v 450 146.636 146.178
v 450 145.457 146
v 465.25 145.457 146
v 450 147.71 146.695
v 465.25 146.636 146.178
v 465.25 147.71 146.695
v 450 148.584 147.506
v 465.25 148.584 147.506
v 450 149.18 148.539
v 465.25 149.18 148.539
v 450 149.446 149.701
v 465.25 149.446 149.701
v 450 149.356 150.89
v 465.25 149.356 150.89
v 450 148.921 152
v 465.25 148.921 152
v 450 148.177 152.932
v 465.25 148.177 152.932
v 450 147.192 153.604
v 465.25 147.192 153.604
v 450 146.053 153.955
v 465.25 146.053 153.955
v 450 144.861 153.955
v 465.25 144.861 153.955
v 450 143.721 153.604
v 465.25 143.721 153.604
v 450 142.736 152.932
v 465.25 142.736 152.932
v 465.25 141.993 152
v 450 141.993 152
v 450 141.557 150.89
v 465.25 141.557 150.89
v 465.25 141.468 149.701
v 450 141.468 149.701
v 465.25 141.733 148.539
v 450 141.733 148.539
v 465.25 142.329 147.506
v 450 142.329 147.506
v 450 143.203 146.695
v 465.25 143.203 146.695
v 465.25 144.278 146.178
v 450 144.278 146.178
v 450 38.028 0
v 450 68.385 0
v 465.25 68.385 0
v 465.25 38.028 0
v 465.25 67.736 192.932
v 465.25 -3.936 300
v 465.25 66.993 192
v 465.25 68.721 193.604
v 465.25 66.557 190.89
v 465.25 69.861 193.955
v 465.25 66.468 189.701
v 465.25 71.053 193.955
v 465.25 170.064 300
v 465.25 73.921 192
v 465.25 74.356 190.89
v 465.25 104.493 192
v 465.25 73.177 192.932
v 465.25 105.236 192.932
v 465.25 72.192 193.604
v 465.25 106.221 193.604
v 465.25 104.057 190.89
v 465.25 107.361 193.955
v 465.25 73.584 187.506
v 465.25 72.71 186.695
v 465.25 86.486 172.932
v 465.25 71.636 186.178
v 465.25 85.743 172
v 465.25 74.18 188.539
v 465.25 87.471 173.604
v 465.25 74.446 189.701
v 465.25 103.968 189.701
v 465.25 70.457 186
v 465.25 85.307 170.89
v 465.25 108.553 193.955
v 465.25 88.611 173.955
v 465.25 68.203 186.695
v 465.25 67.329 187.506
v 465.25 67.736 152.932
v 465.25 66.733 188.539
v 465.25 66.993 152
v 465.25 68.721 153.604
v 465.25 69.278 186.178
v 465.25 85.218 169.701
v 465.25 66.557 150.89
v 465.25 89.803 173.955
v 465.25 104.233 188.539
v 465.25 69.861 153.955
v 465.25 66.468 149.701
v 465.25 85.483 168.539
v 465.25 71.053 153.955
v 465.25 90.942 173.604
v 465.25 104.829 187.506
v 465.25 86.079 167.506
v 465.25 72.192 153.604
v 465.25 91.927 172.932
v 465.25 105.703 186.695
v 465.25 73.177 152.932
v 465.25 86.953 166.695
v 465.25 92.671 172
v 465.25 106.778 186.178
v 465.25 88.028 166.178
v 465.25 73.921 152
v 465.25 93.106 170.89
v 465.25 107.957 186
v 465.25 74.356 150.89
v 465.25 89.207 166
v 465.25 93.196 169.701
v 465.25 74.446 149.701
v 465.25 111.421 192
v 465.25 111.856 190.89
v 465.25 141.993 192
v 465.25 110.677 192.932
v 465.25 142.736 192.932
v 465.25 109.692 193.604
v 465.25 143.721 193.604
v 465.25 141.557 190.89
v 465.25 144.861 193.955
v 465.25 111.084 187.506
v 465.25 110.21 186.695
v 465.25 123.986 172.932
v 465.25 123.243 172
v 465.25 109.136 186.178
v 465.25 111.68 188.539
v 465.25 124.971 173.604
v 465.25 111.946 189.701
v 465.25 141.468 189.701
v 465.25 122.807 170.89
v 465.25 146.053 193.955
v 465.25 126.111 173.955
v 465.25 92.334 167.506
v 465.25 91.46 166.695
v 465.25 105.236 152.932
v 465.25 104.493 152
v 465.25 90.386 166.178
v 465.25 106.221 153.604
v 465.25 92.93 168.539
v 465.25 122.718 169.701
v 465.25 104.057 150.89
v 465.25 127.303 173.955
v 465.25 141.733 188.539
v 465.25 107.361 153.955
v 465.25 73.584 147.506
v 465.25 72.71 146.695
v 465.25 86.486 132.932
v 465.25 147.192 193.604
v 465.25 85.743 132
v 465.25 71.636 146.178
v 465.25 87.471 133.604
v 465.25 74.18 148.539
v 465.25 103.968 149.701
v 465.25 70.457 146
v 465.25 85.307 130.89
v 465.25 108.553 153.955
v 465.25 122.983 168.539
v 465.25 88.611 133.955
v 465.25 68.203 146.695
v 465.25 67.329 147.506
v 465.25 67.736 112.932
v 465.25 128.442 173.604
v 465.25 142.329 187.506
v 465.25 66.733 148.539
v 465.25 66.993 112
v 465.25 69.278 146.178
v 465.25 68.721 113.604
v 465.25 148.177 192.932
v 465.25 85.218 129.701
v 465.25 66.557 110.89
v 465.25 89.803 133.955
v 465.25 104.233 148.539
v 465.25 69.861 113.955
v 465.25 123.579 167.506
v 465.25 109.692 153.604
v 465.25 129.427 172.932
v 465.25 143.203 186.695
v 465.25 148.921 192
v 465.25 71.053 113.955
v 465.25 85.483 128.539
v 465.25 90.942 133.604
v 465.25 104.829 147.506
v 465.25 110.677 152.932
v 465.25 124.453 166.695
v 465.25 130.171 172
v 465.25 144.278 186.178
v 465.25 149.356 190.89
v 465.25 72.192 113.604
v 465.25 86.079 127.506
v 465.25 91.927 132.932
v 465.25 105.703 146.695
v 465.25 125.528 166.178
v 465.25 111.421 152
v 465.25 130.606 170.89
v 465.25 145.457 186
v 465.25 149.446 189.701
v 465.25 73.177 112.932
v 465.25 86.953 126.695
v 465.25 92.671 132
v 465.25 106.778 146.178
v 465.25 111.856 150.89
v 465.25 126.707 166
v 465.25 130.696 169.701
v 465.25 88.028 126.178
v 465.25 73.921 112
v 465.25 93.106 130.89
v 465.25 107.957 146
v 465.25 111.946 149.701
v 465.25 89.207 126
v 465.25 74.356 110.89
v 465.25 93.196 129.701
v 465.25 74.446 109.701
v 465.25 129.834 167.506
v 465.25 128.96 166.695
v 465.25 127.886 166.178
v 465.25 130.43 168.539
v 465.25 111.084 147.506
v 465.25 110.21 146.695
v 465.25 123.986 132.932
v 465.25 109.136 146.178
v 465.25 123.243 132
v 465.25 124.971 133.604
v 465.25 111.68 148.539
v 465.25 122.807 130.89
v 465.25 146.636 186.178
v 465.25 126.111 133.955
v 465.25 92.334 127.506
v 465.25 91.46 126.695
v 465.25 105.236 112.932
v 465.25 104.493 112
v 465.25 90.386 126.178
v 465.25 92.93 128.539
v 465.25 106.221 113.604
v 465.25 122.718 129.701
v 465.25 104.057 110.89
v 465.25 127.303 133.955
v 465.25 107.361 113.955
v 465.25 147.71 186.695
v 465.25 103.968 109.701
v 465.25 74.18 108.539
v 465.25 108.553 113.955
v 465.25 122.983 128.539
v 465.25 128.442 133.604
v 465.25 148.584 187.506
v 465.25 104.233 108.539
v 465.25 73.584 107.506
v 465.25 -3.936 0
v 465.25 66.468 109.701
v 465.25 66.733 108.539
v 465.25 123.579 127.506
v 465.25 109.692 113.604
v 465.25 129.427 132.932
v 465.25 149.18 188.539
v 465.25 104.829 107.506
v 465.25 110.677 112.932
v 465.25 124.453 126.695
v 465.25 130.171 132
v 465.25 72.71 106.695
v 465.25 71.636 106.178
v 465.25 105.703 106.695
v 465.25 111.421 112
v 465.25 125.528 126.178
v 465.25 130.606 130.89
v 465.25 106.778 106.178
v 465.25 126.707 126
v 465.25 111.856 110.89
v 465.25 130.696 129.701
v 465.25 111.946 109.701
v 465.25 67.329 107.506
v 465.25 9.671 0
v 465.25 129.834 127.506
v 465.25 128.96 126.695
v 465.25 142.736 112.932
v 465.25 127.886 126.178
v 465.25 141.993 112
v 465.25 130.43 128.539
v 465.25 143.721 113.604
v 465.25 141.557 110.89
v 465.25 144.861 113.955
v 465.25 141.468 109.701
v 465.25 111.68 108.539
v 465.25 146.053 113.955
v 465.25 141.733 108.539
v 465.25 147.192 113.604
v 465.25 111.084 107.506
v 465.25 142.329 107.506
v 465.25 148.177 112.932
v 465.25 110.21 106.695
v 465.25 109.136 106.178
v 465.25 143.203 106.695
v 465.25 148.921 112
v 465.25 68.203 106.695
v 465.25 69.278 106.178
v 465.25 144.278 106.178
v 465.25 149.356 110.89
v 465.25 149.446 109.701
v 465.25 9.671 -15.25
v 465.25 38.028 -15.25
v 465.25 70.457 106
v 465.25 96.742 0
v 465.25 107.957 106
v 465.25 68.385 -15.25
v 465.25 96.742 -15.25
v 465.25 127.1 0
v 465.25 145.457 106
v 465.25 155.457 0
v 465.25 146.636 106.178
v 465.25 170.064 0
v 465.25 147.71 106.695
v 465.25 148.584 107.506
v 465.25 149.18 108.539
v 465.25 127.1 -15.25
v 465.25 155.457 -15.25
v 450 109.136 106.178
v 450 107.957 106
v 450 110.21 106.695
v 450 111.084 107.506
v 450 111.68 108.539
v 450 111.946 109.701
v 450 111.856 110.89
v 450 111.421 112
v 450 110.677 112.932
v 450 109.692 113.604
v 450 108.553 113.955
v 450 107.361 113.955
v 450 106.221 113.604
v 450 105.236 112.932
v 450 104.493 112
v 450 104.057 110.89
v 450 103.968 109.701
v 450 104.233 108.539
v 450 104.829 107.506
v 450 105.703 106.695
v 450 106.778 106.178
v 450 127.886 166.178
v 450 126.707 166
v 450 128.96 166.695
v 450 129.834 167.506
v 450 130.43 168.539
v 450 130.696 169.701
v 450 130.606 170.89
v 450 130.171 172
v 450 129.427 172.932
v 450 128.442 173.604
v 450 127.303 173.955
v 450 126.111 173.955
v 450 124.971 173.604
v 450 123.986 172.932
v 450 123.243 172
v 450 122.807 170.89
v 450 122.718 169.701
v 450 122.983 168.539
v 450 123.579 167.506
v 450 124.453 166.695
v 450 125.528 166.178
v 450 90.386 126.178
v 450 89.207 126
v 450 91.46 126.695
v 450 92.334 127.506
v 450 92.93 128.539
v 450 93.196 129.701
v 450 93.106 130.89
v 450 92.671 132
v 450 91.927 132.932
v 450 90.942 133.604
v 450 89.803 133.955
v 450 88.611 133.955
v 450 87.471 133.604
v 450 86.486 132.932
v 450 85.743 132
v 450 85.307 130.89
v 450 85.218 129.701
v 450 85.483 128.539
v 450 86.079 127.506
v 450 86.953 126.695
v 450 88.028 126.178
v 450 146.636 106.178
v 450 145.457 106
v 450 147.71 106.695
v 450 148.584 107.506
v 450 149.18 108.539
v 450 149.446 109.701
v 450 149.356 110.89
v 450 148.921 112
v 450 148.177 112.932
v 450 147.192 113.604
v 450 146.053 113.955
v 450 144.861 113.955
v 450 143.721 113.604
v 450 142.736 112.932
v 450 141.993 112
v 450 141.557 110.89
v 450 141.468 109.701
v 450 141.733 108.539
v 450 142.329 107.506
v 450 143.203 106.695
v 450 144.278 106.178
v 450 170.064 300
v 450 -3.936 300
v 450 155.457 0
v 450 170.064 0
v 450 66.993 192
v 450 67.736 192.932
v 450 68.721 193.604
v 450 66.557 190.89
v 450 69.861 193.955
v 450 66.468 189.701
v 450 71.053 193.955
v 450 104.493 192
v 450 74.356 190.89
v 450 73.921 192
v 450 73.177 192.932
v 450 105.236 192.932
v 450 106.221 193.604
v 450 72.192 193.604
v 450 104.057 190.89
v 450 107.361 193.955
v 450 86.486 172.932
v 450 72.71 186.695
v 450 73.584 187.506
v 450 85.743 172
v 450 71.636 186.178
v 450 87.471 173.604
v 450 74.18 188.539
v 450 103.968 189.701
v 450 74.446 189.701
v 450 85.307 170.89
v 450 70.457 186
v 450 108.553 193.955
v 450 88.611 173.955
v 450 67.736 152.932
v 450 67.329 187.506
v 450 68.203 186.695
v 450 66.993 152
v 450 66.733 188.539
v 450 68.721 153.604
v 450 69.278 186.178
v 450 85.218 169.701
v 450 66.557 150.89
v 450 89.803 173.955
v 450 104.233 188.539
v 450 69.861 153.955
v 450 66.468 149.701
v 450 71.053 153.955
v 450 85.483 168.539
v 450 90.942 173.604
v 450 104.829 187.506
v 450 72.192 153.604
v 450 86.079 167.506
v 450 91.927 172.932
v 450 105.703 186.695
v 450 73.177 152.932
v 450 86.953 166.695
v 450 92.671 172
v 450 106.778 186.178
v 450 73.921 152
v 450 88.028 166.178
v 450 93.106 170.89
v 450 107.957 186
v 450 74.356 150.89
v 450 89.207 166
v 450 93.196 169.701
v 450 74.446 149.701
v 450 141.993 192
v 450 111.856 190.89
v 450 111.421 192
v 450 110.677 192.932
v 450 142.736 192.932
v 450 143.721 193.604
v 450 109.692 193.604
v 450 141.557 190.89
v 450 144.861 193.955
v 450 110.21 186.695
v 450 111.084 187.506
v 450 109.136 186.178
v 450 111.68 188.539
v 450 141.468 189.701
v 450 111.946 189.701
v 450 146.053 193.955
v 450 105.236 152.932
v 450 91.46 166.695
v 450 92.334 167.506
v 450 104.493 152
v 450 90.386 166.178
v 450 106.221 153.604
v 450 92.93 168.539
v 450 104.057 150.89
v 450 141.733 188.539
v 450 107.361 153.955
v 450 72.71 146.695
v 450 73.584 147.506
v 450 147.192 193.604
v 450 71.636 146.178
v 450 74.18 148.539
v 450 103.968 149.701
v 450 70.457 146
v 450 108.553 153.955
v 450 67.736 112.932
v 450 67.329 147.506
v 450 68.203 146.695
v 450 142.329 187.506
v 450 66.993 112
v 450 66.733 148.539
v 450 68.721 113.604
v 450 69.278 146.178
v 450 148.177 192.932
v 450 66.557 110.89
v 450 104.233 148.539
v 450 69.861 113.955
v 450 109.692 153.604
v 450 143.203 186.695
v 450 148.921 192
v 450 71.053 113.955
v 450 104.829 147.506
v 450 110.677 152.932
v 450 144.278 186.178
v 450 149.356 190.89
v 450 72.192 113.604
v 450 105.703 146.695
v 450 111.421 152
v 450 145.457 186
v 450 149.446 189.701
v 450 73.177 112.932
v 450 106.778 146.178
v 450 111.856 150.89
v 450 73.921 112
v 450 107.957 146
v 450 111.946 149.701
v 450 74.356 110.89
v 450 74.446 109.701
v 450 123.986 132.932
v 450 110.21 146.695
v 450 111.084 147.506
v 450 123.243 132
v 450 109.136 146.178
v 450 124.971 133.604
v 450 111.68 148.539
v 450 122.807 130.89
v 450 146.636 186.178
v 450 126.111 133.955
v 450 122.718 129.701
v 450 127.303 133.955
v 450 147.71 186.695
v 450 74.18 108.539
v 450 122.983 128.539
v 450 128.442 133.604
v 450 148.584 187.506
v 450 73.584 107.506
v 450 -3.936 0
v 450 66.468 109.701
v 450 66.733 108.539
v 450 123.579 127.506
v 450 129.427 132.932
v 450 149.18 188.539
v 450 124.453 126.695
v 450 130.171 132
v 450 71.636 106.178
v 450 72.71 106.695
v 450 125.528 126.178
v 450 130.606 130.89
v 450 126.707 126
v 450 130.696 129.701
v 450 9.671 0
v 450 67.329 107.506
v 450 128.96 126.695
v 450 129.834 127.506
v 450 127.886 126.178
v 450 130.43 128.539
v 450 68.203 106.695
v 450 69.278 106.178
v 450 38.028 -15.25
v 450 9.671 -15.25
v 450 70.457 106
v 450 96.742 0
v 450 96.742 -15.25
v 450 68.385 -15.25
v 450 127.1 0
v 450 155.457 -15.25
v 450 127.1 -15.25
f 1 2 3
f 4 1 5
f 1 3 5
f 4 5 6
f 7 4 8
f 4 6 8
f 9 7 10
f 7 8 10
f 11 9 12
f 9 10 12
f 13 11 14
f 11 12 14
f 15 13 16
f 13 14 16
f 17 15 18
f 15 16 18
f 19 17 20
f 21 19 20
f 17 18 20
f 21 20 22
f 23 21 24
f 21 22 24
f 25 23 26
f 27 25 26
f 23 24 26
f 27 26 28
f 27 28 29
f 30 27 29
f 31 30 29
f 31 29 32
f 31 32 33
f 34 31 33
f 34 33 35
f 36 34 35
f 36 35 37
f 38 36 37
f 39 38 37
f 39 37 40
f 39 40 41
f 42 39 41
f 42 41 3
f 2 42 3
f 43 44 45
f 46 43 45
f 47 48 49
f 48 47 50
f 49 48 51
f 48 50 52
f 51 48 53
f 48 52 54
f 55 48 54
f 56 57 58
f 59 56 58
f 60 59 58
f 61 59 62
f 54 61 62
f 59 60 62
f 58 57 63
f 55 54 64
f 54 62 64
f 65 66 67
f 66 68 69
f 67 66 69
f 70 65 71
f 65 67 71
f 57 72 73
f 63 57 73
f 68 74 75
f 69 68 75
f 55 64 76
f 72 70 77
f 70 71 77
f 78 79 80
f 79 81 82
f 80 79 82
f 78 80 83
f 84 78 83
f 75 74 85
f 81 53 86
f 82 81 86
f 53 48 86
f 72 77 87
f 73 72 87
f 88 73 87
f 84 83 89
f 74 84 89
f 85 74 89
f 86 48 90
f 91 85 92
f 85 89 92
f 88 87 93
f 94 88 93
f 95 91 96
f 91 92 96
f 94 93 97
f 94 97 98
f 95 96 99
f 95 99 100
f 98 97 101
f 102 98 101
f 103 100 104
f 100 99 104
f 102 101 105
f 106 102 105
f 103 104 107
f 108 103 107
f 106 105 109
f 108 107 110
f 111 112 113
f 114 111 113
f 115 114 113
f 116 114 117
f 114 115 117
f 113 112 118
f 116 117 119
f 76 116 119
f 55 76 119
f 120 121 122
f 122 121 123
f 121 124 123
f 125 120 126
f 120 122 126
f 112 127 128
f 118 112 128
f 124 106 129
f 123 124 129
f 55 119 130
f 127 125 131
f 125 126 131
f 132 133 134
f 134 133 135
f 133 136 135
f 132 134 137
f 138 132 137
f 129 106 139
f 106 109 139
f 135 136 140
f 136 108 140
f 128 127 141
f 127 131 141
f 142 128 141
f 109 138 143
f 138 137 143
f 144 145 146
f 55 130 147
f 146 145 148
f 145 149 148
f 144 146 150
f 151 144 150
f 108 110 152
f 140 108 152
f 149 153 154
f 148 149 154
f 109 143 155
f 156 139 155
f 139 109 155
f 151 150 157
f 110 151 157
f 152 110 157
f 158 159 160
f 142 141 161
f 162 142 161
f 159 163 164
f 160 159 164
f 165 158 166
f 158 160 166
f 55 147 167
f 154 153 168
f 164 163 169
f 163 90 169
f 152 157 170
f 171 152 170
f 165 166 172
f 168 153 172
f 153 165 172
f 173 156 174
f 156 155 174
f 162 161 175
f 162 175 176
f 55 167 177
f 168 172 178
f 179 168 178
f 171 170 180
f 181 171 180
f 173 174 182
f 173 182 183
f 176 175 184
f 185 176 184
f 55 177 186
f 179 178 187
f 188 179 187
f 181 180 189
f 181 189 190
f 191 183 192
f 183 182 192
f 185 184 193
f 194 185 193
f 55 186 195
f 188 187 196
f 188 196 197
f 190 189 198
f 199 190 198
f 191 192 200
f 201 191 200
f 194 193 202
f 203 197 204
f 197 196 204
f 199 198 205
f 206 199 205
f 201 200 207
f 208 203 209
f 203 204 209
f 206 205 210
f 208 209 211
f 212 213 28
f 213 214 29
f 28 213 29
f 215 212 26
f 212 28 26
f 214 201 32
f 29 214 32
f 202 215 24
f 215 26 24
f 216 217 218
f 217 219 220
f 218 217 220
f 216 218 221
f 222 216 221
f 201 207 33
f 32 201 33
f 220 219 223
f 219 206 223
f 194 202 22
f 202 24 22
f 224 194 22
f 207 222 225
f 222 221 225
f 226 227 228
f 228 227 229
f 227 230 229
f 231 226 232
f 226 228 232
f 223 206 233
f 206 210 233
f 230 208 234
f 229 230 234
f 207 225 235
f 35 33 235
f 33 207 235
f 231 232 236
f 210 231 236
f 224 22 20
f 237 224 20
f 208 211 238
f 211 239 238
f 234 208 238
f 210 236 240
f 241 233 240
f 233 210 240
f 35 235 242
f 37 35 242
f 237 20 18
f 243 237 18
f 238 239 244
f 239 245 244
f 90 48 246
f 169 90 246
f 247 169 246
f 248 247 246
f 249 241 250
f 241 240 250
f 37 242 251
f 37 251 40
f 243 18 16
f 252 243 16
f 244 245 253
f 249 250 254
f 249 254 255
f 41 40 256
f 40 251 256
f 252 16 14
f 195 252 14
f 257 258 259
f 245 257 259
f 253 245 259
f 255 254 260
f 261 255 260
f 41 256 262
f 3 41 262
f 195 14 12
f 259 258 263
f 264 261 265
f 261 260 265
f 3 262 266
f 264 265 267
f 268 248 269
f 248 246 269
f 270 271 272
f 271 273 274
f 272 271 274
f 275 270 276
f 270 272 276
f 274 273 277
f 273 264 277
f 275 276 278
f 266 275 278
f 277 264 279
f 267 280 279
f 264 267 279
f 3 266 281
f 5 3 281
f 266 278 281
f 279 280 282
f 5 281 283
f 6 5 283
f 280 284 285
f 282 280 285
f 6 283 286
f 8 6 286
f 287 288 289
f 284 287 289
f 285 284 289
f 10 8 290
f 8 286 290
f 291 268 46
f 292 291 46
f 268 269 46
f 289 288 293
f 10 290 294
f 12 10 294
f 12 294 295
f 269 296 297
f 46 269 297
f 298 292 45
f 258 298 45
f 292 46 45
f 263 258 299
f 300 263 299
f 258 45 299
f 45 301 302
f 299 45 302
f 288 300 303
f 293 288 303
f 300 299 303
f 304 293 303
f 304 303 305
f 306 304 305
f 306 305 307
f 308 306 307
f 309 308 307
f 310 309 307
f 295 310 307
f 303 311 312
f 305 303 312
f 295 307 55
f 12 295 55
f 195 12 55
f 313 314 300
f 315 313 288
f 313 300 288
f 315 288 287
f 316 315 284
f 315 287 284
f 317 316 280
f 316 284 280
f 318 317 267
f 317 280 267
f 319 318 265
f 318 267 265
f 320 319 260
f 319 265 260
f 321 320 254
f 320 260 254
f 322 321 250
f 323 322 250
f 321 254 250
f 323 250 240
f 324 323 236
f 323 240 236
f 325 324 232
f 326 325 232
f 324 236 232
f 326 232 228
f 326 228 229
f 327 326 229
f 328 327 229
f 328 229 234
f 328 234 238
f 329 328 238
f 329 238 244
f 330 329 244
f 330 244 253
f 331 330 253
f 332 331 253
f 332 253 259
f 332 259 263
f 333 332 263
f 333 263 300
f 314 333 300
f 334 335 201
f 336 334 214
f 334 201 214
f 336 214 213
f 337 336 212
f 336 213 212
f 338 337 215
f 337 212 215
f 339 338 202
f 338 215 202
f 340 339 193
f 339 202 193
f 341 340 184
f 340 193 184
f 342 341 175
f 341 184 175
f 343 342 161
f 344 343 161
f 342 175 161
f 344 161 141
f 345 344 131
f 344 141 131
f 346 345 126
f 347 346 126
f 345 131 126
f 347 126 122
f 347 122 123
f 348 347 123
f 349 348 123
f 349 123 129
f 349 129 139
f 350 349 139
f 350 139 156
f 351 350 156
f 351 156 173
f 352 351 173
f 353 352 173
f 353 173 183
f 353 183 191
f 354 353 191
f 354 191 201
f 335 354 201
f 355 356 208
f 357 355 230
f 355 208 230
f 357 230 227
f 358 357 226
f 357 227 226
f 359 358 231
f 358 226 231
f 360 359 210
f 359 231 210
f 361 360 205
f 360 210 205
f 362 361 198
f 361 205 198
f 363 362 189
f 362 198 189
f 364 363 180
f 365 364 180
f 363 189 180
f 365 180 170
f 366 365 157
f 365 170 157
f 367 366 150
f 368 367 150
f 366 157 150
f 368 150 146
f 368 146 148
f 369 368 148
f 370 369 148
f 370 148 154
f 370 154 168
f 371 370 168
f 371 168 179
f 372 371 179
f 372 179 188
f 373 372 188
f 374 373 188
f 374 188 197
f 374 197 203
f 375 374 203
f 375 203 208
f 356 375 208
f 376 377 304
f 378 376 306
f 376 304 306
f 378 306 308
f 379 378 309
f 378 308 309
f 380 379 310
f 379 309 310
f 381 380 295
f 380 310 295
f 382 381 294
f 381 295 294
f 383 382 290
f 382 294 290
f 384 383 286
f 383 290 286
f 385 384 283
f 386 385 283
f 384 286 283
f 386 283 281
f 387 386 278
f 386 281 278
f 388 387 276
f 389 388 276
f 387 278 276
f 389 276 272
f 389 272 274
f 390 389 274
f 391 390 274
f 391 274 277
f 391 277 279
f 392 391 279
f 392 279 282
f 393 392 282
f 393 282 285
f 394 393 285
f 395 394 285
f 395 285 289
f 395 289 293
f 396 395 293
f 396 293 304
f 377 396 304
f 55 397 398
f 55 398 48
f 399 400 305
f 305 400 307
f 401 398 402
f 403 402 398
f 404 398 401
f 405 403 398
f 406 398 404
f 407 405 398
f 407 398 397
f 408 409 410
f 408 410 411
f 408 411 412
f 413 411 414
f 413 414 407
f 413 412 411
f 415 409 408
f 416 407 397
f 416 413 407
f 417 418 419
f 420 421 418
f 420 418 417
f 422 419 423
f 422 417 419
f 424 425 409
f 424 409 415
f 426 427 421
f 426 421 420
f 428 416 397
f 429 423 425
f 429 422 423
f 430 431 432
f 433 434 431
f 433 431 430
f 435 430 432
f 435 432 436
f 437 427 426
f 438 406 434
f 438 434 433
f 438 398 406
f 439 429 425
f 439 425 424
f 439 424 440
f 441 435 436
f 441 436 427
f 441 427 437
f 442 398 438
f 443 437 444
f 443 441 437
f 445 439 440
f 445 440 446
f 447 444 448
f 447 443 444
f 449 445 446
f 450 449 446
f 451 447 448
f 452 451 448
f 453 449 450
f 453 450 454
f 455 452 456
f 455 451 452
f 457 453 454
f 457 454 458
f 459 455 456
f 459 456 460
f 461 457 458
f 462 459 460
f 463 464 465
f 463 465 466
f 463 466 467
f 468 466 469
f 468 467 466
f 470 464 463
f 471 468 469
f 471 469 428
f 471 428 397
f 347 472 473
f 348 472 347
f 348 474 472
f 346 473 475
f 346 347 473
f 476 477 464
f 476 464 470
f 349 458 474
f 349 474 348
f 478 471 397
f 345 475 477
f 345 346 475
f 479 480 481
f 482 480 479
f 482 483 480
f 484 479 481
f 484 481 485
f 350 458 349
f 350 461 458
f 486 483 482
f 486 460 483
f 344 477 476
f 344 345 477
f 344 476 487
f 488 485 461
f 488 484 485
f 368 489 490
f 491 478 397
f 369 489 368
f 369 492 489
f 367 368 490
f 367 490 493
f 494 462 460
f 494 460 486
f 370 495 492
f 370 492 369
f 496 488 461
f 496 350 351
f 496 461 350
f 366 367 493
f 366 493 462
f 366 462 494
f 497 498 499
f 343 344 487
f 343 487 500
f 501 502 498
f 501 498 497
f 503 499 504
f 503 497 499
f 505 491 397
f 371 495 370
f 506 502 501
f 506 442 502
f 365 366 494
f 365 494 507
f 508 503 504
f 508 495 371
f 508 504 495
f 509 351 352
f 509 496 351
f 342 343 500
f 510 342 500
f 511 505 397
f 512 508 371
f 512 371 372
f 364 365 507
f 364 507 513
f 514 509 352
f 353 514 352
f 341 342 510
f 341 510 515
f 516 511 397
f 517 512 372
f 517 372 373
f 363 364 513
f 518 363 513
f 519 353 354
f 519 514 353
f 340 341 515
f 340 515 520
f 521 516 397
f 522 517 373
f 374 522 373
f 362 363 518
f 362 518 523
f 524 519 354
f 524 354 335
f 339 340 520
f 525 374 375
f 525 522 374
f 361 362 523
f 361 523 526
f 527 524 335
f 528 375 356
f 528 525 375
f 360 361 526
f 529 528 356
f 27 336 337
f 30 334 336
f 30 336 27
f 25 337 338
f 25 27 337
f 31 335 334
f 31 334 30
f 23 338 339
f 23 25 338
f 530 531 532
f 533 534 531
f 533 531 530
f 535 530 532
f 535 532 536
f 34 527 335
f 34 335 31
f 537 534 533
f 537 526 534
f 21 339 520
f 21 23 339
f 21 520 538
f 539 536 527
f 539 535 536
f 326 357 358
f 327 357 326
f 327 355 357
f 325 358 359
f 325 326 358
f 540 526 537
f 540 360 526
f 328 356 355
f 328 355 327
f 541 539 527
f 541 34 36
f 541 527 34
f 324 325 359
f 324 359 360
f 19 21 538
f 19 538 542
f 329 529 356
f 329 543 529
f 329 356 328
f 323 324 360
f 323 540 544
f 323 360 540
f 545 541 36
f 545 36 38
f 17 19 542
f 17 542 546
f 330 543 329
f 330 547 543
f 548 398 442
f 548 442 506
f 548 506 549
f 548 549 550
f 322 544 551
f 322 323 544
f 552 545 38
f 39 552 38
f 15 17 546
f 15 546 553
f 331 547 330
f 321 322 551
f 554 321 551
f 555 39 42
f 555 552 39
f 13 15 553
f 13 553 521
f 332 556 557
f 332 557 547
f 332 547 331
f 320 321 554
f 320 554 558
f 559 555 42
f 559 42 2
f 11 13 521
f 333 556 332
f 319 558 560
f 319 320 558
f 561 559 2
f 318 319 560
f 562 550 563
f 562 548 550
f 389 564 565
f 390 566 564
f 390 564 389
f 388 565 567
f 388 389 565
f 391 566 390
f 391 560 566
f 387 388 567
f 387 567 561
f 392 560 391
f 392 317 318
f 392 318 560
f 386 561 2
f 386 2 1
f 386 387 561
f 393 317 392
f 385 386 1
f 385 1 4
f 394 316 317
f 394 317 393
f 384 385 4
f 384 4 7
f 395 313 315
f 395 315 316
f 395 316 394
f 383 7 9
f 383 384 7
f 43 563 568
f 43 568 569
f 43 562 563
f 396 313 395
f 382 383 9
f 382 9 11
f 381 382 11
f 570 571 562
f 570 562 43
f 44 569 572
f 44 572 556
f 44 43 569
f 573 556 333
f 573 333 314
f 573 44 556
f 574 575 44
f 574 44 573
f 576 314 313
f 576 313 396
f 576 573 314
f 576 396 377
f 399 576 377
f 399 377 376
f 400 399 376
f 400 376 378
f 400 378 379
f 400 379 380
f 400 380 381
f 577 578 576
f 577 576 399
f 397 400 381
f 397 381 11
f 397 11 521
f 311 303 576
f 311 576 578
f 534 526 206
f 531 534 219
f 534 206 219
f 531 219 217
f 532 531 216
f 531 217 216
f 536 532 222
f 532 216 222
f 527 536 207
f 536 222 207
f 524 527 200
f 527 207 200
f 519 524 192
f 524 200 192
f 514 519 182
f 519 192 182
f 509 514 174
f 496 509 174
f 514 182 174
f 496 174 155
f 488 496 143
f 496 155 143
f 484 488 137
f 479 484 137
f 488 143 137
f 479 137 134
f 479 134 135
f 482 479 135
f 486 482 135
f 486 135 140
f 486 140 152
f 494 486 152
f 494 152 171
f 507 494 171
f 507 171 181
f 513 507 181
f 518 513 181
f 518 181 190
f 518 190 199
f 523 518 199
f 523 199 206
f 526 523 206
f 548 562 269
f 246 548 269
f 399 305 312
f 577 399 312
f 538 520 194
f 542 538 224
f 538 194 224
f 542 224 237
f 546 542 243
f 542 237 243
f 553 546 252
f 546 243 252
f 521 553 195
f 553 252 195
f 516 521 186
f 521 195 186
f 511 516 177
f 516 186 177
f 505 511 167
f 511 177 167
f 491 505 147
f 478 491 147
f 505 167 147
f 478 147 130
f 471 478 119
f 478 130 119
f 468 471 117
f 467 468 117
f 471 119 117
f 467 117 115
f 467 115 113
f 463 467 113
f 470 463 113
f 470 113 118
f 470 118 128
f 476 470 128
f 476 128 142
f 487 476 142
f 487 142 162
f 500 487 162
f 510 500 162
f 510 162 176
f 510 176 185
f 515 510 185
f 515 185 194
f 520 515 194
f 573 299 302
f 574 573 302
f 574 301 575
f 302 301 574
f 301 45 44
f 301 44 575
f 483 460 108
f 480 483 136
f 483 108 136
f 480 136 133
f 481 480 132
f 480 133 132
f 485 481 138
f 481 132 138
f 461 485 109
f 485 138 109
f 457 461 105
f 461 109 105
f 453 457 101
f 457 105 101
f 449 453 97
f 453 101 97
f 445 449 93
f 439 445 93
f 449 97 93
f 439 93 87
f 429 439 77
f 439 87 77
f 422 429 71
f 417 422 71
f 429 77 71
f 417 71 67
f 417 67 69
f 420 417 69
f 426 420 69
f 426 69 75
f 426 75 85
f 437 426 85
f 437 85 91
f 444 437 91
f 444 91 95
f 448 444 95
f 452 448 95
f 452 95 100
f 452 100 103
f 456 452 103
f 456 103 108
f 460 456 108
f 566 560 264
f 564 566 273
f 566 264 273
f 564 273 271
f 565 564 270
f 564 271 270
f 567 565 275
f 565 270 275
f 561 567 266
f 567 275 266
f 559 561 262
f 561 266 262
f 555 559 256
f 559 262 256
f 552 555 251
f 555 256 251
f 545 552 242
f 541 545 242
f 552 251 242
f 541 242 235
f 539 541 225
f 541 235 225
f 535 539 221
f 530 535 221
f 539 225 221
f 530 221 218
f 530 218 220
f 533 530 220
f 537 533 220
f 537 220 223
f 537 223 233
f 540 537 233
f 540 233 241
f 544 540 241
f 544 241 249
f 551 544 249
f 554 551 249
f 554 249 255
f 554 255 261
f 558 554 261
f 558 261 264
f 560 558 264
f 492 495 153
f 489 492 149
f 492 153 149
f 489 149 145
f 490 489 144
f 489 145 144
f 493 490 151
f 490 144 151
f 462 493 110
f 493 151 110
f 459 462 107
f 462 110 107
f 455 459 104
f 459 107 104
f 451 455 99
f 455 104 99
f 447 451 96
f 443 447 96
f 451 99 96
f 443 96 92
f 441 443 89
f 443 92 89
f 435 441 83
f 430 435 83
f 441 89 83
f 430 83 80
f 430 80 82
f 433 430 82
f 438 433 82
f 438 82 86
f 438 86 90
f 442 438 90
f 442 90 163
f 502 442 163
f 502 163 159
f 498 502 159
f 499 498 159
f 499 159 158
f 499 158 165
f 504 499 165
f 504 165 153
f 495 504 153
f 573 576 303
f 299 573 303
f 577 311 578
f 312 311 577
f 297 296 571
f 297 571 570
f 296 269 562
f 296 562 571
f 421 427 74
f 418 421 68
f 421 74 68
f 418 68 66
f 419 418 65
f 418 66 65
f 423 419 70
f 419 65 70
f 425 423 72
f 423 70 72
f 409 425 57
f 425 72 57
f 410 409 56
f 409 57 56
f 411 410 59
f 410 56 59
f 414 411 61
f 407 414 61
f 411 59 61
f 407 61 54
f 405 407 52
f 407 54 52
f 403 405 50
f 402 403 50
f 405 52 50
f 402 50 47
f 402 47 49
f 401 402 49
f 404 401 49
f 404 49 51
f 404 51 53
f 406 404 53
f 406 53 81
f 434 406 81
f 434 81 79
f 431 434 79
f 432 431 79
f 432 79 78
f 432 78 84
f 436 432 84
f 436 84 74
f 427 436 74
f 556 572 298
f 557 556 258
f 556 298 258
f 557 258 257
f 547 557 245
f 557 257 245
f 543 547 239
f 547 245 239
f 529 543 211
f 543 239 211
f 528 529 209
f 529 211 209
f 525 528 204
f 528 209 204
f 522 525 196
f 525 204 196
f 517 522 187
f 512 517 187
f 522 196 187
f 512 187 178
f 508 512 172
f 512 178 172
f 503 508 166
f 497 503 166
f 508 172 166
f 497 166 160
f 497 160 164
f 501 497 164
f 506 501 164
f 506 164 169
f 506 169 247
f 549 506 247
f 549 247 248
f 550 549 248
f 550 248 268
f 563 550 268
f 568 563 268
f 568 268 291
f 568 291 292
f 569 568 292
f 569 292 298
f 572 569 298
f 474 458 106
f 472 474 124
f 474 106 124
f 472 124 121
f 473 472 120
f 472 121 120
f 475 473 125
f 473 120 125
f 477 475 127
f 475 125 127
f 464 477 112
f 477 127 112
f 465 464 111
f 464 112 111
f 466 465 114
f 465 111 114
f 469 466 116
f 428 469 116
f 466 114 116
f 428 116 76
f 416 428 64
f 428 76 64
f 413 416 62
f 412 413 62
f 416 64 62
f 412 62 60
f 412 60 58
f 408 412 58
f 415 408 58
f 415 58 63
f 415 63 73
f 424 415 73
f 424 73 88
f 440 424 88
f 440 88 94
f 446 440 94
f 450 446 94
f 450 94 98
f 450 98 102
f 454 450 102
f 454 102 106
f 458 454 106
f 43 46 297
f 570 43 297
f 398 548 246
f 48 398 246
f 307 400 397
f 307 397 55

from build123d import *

# Parameters (mm, degrees)
ESQUISSE1_W             = 15.25
ESQUISSE1_H             = 174
BOSS_EXTRU_1_DEPTH      = 300
ESQUISSE2_W             = 15.25
ESQUISSE2_H             = 28.357142857
BOSS_EXTRU_2_DEPTH      = 15.25
ENL_V_MAT_EXTRU_1_REACH = 17.25
ESQUISSE3_R             = 4


with BuildPart() as part:
    # Esquisse1 → Boss.-Extru.1 (new body)
    with BuildSketch(Plane.XY):
        with Locations((457.625, 83.063864629)):
            Rectangle(ESQUISSE1_W, ESQUISSE1_H)
    extrude(amount=BOSS_EXTRU_1_DEPTH)

    # Esquisse2 → Boss.-Extru.2 (add)
    with BuildSketch(Plane(origin=(465.25, 0, 0), x_dir=(0, 0, -1), z_dir=(1, 0, 0))):
        with Locations((7.625, 141.278150344)):
            Rectangle(ESQUISSE2_W, ESQUISSE2_H)
        with Locations((7.625, 82.563864628)):
            Rectangle(ESQUISSE2_W, ESQUISSE2_H)
        with Locations((7.625, 23.849578915)):
            Rectangle(ESQUISSE2_W, ESQUISSE2_H)
    extrude(amount=-BOSS_EXTRU_2_DEPTH)

    # Esquisse3 → Enlèv. mat.-Extru.1 (cut, up to next)
    with BuildSketch(Plane(origin=(465.25, 0, 0), x_dir=(0, 0, -1), z_dir=(1, 0, 0)), mode=Mode.PRIVATE) as enl_v_mat_extru_1_sk1:
        with Locations((-110, 145.456721772)):
            Circle(ESQUISSE3_R)
    enl_v_mat_extru_1_tool1 = extrude(enl_v_mat_extru_1_sk1.sketch, amount=-ENL_V_MAT_EXTRU_1_REACH, mode=Mode.PRIVATE) & part.part
    add(enl_v_mat_extru_1_tool1.solids().sort_by_distance((465.25, 145.456722, 110))[0], mode=Mode.SUBTRACT)
    # Esquisse3 → Enlèv. mat.-Extru.1 (cut, up to next)
    with BuildSketch(Plane(origin=(465.25, 0, 0), x_dir=(0, 0, -1), z_dir=(1, 0, 0)), mode=Mode.PRIVATE) as enl_v_mat_extru_1_sk2:
        with Locations((-110, 70.456721772)):
            Circle(ESQUISSE3_R)
    enl_v_mat_extru_1_tool2 = extrude(enl_v_mat_extru_1_sk2.sketch, amount=-ENL_V_MAT_EXTRU_1_REACH, mode=Mode.PRIVATE) & part.part
    add(enl_v_mat_extru_1_tool2.solids().sort_by_distance((465.25, 70.456722, 110))[0], mode=Mode.SUBTRACT)
    # Esquisse3 → Enlèv. mat.-Extru.1 (cut, up to next)
    with BuildSketch(Plane(origin=(465.25, 0, 0), x_dir=(0, 0, -1), z_dir=(1, 0, 0)), mode=Mode.PRIVATE) as enl_v_mat_extru_1_sk3:
        with Locations((-150, 70.456721772)):
            Circle(ESQUISSE3_R)
    enl_v_mat_extru_1_tool3 = extrude(enl_v_mat_extru_1_sk3.sketch, amount=-ENL_V_MAT_EXTRU_1_REACH, mode=Mode.PRIVATE) & part.part
    add(enl_v_mat_extru_1_tool3.solids().sort_by_distance((465.25, 70.456722, 150))[0], mode=Mode.SUBTRACT)
    # Esquisse3 → Enlèv. mat.-Extru.1 (cut, up to next)
    with BuildSketch(Plane(origin=(465.25, 0, 0), x_dir=(0, 0, -1), z_dir=(1, 0, 0)), mode=Mode.PRIVATE) as enl_v_mat_extru_1_sk4:
        with Locations((-150, 145.456721772)):
            Circle(ESQUISSE3_R)
    enl_v_mat_extru_1_tool4 = extrude(enl_v_mat_extru_1_sk4.sketch, amount=-ENL_V_MAT_EXTRU_1_REACH, mode=Mode.PRIVATE) & part.part
    add(enl_v_mat_extru_1_tool4.solids().sort_by_distance((465.25, 145.456722, 150))[0], mode=Mode.SUBTRACT)
    # Esquisse3 → Enlèv. mat.-Extru.1 (cut, up to next)
    with BuildSketch(Plane(origin=(465.25, 0, 0), x_dir=(0, 0, -1), z_dir=(1, 0, 0)), mode=Mode.PRIVATE) as enl_v_mat_extru_1_sk5:
        with Locations((-190, 145.456721772)):
            Circle(ESQUISSE3_R)
    enl_v_mat_extru_1_tool5 = extrude(enl_v_mat_extru_1_sk5.sketch, amount=-ENL_V_MAT_EXTRU_1_REACH, mode=Mode.PRIVATE) & part.part
    add(enl_v_mat_extru_1_tool5.solids().sort_by_distance((465.25, 145.456722, 190))[0], mode=Mode.SUBTRACT)
    # Esquisse3 → Enlèv. mat.-Extru.1 (cut, up to next)
    with BuildSketch(Plane(origin=(465.25, 0, 0), x_dir=(0, 0, -1), z_dir=(1, 0, 0)), mode=Mode.PRIVATE) as enl_v_mat_extru_1_sk6:
        with Locations((-190, 70.456721772)):
            Circle(ESQUISSE3_R)
    enl_v_mat_extru_1_tool6 = extrude(enl_v_mat_extru_1_sk6.sketch, amount=-ENL_V_MAT_EXTRU_1_REACH, mode=Mode.PRIVATE) & part.part
    add(enl_v_mat_extru_1_tool6.solids().sort_by_distance((465.25, 70.456722, 190))[0], mode=Mode.SUBTRACT)
    # Esquisse3 → Enlèv. mat.-Extru.1 (cut, up to next)
    with BuildSketch(Plane(origin=(465.25, 0, 0), x_dir=(0, 0, -1), z_dir=(1, 0, 0)), mode=Mode.PRIVATE) as enl_v_mat_extru_1_sk7:
        with Locations((-130, 126.706721772)):
            Circle(ESQUISSE3_R)
    enl_v_mat_extru_1_tool7 = extrude(enl_v_mat_extru_1_sk7.sketch, amount=-ENL_V_MAT_EXTRU_1_REACH, mode=Mode.PRIVATE) & part.part
    add(enl_v_mat_extru_1_tool7.solids().sort_by_distance((465.25, 126.706722, 130))[0], mode=Mode.SUBTRACT)
    # Esquisse3 → Enlèv. mat.-Extru.1 (cut, up to next)
    with BuildSketch(Plane(origin=(465.25, 0, 0), x_dir=(0, 0, -1), z_dir=(1, 0, 0)), mode=Mode.PRIVATE) as enl_v_mat_extru_1_sk8:
        with Locations((-170, 126.706721772)):
            Circle(ESQUISSE3_R)
    enl_v_mat_extru_1_tool8 = extrude(enl_v_mat_extru_1_sk8.sketch, amount=-ENL_V_MAT_EXTRU_1_REACH, mode=Mode.PRIVATE) & part.part
    add(enl_v_mat_extru_1_tool8.solids().sort_by_distance((465.25, 126.706722, 170))[0], mode=Mode.SUBTRACT)
    # Esquisse3 → Enlèv. mat.-Extru.1 (cut, up to next)
    with BuildSketch(Plane(origin=(465.25, 0, 0), x_dir=(0, 0, -1), z_dir=(1, 0, 0)), mode=Mode.PRIVATE) as enl_v_mat_extru_1_sk9:
        with Locations((-190, 107.956721772)):
            Circle(ESQUISSE3_R)
    enl_v_mat_extru_1_tool9 = extrude(enl_v_mat_extru_1_sk9.sketch, amount=-ENL_V_MAT_EXTRU_1_REACH, mode=Mode.PRIVATE) & part.part
    add(enl_v_mat_extru_1_tool9.solids().sort_by_distance((465.25, 107.956722, 190))[0], mode=Mode.SUBTRACT)
    # Esquisse3 → Enlèv. mat.-Extru.1 (cut, up to next)
    with BuildSketch(Plane(origin=(465.25, 0, 0), x_dir=(0, 0, -1), z_dir=(1, 0, 0)), mode=Mode.PRIVATE) as enl_v_mat_extru_1_sk10:
        with Locations((-170, 89.206721772)):
            Circle(ESQUISSE3_R)
    enl_v_mat_extru_1_tool10 = extrude(enl_v_mat_extru_1_sk10.sketch, amount=-ENL_V_MAT_EXTRU_1_REACH, mode=Mode.PRIVATE) & part.part
    add(enl_v_mat_extru_1_tool10.solids().sort_by_distance((465.25, 89.206722, 170))[0], mode=Mode.SUBTRACT)
    # Esquisse3 → Enlèv. mat.-Extru.1 (cut, up to next)
    with BuildSketch(Plane(origin=(465.25, 0, 0), x_dir=(0, 0, -1), z_dir=(1, 0, 0)), mode=Mode.PRIVATE) as enl_v_mat_extru_1_sk11:
        with Locations((-130, 89.206721772)):
            Circle(ESQUISSE3_R)
    enl_v_mat_extru_1_tool11 = extrude(enl_v_mat_extru_1_sk11.sketch, amount=-ENL_V_MAT_EXTRU_1_REACH, mode=Mode.PRIVATE) & part.part
    add(enl_v_mat_extru_1_tool11.solids().sort_by_distance((465.25, 89.206722, 130))[0], mode=Mode.SUBTRACT)
    # Esquisse3 → Enlèv. mat.-Extru.1 (cut, up to next)
    with BuildSketch(Plane(origin=(465.25, 0, 0), x_dir=(0, 0, -1), z_dir=(1, 0, 0)), mode=Mode.PRIVATE) as enl_v_mat_extru_1_sk12:
        with Locations((-110, 107.956721772)):
            Circle(ESQUISSE3_R)
    enl_v_mat_extru_1_tool12 = extrude(enl_v_mat_extru_1_sk12.sketch, amount=-ENL_V_MAT_EXTRU_1_REACH, mode=Mode.PRIVATE) & part.part
    add(enl_v_mat_extru_1_tool12.solids().sort_by_distance((465.25, 107.956722, 110))[0], mode=Mode.SUBTRACT)
    # Esquisse3 → Enlèv. mat.-Extru.1 (cut, up to next)
    with BuildSketch(Plane(origin=(465.25, 0, 0), x_dir=(0, 0, -1), z_dir=(1, 0, 0)), mode=Mode.PRIVATE) as enl_v_mat_extru_1_sk13:
        with Locations((-150, 107.956721772)):
            Circle(ESQUISSE3_R)
    enl_v_mat_extru_1_tool13 = extrude(enl_v_mat_extru_1_sk13.sketch, amount=-ENL_V_MAT_EXTRU_1_REACH, mode=Mode.PRIVATE) & part.part
    add(enl_v_mat_extru_1_tool13.solids().sort_by_distance((465.25, 107.956722, 150))[0], mode=Mode.SUBTRACT)


solid = part.part
